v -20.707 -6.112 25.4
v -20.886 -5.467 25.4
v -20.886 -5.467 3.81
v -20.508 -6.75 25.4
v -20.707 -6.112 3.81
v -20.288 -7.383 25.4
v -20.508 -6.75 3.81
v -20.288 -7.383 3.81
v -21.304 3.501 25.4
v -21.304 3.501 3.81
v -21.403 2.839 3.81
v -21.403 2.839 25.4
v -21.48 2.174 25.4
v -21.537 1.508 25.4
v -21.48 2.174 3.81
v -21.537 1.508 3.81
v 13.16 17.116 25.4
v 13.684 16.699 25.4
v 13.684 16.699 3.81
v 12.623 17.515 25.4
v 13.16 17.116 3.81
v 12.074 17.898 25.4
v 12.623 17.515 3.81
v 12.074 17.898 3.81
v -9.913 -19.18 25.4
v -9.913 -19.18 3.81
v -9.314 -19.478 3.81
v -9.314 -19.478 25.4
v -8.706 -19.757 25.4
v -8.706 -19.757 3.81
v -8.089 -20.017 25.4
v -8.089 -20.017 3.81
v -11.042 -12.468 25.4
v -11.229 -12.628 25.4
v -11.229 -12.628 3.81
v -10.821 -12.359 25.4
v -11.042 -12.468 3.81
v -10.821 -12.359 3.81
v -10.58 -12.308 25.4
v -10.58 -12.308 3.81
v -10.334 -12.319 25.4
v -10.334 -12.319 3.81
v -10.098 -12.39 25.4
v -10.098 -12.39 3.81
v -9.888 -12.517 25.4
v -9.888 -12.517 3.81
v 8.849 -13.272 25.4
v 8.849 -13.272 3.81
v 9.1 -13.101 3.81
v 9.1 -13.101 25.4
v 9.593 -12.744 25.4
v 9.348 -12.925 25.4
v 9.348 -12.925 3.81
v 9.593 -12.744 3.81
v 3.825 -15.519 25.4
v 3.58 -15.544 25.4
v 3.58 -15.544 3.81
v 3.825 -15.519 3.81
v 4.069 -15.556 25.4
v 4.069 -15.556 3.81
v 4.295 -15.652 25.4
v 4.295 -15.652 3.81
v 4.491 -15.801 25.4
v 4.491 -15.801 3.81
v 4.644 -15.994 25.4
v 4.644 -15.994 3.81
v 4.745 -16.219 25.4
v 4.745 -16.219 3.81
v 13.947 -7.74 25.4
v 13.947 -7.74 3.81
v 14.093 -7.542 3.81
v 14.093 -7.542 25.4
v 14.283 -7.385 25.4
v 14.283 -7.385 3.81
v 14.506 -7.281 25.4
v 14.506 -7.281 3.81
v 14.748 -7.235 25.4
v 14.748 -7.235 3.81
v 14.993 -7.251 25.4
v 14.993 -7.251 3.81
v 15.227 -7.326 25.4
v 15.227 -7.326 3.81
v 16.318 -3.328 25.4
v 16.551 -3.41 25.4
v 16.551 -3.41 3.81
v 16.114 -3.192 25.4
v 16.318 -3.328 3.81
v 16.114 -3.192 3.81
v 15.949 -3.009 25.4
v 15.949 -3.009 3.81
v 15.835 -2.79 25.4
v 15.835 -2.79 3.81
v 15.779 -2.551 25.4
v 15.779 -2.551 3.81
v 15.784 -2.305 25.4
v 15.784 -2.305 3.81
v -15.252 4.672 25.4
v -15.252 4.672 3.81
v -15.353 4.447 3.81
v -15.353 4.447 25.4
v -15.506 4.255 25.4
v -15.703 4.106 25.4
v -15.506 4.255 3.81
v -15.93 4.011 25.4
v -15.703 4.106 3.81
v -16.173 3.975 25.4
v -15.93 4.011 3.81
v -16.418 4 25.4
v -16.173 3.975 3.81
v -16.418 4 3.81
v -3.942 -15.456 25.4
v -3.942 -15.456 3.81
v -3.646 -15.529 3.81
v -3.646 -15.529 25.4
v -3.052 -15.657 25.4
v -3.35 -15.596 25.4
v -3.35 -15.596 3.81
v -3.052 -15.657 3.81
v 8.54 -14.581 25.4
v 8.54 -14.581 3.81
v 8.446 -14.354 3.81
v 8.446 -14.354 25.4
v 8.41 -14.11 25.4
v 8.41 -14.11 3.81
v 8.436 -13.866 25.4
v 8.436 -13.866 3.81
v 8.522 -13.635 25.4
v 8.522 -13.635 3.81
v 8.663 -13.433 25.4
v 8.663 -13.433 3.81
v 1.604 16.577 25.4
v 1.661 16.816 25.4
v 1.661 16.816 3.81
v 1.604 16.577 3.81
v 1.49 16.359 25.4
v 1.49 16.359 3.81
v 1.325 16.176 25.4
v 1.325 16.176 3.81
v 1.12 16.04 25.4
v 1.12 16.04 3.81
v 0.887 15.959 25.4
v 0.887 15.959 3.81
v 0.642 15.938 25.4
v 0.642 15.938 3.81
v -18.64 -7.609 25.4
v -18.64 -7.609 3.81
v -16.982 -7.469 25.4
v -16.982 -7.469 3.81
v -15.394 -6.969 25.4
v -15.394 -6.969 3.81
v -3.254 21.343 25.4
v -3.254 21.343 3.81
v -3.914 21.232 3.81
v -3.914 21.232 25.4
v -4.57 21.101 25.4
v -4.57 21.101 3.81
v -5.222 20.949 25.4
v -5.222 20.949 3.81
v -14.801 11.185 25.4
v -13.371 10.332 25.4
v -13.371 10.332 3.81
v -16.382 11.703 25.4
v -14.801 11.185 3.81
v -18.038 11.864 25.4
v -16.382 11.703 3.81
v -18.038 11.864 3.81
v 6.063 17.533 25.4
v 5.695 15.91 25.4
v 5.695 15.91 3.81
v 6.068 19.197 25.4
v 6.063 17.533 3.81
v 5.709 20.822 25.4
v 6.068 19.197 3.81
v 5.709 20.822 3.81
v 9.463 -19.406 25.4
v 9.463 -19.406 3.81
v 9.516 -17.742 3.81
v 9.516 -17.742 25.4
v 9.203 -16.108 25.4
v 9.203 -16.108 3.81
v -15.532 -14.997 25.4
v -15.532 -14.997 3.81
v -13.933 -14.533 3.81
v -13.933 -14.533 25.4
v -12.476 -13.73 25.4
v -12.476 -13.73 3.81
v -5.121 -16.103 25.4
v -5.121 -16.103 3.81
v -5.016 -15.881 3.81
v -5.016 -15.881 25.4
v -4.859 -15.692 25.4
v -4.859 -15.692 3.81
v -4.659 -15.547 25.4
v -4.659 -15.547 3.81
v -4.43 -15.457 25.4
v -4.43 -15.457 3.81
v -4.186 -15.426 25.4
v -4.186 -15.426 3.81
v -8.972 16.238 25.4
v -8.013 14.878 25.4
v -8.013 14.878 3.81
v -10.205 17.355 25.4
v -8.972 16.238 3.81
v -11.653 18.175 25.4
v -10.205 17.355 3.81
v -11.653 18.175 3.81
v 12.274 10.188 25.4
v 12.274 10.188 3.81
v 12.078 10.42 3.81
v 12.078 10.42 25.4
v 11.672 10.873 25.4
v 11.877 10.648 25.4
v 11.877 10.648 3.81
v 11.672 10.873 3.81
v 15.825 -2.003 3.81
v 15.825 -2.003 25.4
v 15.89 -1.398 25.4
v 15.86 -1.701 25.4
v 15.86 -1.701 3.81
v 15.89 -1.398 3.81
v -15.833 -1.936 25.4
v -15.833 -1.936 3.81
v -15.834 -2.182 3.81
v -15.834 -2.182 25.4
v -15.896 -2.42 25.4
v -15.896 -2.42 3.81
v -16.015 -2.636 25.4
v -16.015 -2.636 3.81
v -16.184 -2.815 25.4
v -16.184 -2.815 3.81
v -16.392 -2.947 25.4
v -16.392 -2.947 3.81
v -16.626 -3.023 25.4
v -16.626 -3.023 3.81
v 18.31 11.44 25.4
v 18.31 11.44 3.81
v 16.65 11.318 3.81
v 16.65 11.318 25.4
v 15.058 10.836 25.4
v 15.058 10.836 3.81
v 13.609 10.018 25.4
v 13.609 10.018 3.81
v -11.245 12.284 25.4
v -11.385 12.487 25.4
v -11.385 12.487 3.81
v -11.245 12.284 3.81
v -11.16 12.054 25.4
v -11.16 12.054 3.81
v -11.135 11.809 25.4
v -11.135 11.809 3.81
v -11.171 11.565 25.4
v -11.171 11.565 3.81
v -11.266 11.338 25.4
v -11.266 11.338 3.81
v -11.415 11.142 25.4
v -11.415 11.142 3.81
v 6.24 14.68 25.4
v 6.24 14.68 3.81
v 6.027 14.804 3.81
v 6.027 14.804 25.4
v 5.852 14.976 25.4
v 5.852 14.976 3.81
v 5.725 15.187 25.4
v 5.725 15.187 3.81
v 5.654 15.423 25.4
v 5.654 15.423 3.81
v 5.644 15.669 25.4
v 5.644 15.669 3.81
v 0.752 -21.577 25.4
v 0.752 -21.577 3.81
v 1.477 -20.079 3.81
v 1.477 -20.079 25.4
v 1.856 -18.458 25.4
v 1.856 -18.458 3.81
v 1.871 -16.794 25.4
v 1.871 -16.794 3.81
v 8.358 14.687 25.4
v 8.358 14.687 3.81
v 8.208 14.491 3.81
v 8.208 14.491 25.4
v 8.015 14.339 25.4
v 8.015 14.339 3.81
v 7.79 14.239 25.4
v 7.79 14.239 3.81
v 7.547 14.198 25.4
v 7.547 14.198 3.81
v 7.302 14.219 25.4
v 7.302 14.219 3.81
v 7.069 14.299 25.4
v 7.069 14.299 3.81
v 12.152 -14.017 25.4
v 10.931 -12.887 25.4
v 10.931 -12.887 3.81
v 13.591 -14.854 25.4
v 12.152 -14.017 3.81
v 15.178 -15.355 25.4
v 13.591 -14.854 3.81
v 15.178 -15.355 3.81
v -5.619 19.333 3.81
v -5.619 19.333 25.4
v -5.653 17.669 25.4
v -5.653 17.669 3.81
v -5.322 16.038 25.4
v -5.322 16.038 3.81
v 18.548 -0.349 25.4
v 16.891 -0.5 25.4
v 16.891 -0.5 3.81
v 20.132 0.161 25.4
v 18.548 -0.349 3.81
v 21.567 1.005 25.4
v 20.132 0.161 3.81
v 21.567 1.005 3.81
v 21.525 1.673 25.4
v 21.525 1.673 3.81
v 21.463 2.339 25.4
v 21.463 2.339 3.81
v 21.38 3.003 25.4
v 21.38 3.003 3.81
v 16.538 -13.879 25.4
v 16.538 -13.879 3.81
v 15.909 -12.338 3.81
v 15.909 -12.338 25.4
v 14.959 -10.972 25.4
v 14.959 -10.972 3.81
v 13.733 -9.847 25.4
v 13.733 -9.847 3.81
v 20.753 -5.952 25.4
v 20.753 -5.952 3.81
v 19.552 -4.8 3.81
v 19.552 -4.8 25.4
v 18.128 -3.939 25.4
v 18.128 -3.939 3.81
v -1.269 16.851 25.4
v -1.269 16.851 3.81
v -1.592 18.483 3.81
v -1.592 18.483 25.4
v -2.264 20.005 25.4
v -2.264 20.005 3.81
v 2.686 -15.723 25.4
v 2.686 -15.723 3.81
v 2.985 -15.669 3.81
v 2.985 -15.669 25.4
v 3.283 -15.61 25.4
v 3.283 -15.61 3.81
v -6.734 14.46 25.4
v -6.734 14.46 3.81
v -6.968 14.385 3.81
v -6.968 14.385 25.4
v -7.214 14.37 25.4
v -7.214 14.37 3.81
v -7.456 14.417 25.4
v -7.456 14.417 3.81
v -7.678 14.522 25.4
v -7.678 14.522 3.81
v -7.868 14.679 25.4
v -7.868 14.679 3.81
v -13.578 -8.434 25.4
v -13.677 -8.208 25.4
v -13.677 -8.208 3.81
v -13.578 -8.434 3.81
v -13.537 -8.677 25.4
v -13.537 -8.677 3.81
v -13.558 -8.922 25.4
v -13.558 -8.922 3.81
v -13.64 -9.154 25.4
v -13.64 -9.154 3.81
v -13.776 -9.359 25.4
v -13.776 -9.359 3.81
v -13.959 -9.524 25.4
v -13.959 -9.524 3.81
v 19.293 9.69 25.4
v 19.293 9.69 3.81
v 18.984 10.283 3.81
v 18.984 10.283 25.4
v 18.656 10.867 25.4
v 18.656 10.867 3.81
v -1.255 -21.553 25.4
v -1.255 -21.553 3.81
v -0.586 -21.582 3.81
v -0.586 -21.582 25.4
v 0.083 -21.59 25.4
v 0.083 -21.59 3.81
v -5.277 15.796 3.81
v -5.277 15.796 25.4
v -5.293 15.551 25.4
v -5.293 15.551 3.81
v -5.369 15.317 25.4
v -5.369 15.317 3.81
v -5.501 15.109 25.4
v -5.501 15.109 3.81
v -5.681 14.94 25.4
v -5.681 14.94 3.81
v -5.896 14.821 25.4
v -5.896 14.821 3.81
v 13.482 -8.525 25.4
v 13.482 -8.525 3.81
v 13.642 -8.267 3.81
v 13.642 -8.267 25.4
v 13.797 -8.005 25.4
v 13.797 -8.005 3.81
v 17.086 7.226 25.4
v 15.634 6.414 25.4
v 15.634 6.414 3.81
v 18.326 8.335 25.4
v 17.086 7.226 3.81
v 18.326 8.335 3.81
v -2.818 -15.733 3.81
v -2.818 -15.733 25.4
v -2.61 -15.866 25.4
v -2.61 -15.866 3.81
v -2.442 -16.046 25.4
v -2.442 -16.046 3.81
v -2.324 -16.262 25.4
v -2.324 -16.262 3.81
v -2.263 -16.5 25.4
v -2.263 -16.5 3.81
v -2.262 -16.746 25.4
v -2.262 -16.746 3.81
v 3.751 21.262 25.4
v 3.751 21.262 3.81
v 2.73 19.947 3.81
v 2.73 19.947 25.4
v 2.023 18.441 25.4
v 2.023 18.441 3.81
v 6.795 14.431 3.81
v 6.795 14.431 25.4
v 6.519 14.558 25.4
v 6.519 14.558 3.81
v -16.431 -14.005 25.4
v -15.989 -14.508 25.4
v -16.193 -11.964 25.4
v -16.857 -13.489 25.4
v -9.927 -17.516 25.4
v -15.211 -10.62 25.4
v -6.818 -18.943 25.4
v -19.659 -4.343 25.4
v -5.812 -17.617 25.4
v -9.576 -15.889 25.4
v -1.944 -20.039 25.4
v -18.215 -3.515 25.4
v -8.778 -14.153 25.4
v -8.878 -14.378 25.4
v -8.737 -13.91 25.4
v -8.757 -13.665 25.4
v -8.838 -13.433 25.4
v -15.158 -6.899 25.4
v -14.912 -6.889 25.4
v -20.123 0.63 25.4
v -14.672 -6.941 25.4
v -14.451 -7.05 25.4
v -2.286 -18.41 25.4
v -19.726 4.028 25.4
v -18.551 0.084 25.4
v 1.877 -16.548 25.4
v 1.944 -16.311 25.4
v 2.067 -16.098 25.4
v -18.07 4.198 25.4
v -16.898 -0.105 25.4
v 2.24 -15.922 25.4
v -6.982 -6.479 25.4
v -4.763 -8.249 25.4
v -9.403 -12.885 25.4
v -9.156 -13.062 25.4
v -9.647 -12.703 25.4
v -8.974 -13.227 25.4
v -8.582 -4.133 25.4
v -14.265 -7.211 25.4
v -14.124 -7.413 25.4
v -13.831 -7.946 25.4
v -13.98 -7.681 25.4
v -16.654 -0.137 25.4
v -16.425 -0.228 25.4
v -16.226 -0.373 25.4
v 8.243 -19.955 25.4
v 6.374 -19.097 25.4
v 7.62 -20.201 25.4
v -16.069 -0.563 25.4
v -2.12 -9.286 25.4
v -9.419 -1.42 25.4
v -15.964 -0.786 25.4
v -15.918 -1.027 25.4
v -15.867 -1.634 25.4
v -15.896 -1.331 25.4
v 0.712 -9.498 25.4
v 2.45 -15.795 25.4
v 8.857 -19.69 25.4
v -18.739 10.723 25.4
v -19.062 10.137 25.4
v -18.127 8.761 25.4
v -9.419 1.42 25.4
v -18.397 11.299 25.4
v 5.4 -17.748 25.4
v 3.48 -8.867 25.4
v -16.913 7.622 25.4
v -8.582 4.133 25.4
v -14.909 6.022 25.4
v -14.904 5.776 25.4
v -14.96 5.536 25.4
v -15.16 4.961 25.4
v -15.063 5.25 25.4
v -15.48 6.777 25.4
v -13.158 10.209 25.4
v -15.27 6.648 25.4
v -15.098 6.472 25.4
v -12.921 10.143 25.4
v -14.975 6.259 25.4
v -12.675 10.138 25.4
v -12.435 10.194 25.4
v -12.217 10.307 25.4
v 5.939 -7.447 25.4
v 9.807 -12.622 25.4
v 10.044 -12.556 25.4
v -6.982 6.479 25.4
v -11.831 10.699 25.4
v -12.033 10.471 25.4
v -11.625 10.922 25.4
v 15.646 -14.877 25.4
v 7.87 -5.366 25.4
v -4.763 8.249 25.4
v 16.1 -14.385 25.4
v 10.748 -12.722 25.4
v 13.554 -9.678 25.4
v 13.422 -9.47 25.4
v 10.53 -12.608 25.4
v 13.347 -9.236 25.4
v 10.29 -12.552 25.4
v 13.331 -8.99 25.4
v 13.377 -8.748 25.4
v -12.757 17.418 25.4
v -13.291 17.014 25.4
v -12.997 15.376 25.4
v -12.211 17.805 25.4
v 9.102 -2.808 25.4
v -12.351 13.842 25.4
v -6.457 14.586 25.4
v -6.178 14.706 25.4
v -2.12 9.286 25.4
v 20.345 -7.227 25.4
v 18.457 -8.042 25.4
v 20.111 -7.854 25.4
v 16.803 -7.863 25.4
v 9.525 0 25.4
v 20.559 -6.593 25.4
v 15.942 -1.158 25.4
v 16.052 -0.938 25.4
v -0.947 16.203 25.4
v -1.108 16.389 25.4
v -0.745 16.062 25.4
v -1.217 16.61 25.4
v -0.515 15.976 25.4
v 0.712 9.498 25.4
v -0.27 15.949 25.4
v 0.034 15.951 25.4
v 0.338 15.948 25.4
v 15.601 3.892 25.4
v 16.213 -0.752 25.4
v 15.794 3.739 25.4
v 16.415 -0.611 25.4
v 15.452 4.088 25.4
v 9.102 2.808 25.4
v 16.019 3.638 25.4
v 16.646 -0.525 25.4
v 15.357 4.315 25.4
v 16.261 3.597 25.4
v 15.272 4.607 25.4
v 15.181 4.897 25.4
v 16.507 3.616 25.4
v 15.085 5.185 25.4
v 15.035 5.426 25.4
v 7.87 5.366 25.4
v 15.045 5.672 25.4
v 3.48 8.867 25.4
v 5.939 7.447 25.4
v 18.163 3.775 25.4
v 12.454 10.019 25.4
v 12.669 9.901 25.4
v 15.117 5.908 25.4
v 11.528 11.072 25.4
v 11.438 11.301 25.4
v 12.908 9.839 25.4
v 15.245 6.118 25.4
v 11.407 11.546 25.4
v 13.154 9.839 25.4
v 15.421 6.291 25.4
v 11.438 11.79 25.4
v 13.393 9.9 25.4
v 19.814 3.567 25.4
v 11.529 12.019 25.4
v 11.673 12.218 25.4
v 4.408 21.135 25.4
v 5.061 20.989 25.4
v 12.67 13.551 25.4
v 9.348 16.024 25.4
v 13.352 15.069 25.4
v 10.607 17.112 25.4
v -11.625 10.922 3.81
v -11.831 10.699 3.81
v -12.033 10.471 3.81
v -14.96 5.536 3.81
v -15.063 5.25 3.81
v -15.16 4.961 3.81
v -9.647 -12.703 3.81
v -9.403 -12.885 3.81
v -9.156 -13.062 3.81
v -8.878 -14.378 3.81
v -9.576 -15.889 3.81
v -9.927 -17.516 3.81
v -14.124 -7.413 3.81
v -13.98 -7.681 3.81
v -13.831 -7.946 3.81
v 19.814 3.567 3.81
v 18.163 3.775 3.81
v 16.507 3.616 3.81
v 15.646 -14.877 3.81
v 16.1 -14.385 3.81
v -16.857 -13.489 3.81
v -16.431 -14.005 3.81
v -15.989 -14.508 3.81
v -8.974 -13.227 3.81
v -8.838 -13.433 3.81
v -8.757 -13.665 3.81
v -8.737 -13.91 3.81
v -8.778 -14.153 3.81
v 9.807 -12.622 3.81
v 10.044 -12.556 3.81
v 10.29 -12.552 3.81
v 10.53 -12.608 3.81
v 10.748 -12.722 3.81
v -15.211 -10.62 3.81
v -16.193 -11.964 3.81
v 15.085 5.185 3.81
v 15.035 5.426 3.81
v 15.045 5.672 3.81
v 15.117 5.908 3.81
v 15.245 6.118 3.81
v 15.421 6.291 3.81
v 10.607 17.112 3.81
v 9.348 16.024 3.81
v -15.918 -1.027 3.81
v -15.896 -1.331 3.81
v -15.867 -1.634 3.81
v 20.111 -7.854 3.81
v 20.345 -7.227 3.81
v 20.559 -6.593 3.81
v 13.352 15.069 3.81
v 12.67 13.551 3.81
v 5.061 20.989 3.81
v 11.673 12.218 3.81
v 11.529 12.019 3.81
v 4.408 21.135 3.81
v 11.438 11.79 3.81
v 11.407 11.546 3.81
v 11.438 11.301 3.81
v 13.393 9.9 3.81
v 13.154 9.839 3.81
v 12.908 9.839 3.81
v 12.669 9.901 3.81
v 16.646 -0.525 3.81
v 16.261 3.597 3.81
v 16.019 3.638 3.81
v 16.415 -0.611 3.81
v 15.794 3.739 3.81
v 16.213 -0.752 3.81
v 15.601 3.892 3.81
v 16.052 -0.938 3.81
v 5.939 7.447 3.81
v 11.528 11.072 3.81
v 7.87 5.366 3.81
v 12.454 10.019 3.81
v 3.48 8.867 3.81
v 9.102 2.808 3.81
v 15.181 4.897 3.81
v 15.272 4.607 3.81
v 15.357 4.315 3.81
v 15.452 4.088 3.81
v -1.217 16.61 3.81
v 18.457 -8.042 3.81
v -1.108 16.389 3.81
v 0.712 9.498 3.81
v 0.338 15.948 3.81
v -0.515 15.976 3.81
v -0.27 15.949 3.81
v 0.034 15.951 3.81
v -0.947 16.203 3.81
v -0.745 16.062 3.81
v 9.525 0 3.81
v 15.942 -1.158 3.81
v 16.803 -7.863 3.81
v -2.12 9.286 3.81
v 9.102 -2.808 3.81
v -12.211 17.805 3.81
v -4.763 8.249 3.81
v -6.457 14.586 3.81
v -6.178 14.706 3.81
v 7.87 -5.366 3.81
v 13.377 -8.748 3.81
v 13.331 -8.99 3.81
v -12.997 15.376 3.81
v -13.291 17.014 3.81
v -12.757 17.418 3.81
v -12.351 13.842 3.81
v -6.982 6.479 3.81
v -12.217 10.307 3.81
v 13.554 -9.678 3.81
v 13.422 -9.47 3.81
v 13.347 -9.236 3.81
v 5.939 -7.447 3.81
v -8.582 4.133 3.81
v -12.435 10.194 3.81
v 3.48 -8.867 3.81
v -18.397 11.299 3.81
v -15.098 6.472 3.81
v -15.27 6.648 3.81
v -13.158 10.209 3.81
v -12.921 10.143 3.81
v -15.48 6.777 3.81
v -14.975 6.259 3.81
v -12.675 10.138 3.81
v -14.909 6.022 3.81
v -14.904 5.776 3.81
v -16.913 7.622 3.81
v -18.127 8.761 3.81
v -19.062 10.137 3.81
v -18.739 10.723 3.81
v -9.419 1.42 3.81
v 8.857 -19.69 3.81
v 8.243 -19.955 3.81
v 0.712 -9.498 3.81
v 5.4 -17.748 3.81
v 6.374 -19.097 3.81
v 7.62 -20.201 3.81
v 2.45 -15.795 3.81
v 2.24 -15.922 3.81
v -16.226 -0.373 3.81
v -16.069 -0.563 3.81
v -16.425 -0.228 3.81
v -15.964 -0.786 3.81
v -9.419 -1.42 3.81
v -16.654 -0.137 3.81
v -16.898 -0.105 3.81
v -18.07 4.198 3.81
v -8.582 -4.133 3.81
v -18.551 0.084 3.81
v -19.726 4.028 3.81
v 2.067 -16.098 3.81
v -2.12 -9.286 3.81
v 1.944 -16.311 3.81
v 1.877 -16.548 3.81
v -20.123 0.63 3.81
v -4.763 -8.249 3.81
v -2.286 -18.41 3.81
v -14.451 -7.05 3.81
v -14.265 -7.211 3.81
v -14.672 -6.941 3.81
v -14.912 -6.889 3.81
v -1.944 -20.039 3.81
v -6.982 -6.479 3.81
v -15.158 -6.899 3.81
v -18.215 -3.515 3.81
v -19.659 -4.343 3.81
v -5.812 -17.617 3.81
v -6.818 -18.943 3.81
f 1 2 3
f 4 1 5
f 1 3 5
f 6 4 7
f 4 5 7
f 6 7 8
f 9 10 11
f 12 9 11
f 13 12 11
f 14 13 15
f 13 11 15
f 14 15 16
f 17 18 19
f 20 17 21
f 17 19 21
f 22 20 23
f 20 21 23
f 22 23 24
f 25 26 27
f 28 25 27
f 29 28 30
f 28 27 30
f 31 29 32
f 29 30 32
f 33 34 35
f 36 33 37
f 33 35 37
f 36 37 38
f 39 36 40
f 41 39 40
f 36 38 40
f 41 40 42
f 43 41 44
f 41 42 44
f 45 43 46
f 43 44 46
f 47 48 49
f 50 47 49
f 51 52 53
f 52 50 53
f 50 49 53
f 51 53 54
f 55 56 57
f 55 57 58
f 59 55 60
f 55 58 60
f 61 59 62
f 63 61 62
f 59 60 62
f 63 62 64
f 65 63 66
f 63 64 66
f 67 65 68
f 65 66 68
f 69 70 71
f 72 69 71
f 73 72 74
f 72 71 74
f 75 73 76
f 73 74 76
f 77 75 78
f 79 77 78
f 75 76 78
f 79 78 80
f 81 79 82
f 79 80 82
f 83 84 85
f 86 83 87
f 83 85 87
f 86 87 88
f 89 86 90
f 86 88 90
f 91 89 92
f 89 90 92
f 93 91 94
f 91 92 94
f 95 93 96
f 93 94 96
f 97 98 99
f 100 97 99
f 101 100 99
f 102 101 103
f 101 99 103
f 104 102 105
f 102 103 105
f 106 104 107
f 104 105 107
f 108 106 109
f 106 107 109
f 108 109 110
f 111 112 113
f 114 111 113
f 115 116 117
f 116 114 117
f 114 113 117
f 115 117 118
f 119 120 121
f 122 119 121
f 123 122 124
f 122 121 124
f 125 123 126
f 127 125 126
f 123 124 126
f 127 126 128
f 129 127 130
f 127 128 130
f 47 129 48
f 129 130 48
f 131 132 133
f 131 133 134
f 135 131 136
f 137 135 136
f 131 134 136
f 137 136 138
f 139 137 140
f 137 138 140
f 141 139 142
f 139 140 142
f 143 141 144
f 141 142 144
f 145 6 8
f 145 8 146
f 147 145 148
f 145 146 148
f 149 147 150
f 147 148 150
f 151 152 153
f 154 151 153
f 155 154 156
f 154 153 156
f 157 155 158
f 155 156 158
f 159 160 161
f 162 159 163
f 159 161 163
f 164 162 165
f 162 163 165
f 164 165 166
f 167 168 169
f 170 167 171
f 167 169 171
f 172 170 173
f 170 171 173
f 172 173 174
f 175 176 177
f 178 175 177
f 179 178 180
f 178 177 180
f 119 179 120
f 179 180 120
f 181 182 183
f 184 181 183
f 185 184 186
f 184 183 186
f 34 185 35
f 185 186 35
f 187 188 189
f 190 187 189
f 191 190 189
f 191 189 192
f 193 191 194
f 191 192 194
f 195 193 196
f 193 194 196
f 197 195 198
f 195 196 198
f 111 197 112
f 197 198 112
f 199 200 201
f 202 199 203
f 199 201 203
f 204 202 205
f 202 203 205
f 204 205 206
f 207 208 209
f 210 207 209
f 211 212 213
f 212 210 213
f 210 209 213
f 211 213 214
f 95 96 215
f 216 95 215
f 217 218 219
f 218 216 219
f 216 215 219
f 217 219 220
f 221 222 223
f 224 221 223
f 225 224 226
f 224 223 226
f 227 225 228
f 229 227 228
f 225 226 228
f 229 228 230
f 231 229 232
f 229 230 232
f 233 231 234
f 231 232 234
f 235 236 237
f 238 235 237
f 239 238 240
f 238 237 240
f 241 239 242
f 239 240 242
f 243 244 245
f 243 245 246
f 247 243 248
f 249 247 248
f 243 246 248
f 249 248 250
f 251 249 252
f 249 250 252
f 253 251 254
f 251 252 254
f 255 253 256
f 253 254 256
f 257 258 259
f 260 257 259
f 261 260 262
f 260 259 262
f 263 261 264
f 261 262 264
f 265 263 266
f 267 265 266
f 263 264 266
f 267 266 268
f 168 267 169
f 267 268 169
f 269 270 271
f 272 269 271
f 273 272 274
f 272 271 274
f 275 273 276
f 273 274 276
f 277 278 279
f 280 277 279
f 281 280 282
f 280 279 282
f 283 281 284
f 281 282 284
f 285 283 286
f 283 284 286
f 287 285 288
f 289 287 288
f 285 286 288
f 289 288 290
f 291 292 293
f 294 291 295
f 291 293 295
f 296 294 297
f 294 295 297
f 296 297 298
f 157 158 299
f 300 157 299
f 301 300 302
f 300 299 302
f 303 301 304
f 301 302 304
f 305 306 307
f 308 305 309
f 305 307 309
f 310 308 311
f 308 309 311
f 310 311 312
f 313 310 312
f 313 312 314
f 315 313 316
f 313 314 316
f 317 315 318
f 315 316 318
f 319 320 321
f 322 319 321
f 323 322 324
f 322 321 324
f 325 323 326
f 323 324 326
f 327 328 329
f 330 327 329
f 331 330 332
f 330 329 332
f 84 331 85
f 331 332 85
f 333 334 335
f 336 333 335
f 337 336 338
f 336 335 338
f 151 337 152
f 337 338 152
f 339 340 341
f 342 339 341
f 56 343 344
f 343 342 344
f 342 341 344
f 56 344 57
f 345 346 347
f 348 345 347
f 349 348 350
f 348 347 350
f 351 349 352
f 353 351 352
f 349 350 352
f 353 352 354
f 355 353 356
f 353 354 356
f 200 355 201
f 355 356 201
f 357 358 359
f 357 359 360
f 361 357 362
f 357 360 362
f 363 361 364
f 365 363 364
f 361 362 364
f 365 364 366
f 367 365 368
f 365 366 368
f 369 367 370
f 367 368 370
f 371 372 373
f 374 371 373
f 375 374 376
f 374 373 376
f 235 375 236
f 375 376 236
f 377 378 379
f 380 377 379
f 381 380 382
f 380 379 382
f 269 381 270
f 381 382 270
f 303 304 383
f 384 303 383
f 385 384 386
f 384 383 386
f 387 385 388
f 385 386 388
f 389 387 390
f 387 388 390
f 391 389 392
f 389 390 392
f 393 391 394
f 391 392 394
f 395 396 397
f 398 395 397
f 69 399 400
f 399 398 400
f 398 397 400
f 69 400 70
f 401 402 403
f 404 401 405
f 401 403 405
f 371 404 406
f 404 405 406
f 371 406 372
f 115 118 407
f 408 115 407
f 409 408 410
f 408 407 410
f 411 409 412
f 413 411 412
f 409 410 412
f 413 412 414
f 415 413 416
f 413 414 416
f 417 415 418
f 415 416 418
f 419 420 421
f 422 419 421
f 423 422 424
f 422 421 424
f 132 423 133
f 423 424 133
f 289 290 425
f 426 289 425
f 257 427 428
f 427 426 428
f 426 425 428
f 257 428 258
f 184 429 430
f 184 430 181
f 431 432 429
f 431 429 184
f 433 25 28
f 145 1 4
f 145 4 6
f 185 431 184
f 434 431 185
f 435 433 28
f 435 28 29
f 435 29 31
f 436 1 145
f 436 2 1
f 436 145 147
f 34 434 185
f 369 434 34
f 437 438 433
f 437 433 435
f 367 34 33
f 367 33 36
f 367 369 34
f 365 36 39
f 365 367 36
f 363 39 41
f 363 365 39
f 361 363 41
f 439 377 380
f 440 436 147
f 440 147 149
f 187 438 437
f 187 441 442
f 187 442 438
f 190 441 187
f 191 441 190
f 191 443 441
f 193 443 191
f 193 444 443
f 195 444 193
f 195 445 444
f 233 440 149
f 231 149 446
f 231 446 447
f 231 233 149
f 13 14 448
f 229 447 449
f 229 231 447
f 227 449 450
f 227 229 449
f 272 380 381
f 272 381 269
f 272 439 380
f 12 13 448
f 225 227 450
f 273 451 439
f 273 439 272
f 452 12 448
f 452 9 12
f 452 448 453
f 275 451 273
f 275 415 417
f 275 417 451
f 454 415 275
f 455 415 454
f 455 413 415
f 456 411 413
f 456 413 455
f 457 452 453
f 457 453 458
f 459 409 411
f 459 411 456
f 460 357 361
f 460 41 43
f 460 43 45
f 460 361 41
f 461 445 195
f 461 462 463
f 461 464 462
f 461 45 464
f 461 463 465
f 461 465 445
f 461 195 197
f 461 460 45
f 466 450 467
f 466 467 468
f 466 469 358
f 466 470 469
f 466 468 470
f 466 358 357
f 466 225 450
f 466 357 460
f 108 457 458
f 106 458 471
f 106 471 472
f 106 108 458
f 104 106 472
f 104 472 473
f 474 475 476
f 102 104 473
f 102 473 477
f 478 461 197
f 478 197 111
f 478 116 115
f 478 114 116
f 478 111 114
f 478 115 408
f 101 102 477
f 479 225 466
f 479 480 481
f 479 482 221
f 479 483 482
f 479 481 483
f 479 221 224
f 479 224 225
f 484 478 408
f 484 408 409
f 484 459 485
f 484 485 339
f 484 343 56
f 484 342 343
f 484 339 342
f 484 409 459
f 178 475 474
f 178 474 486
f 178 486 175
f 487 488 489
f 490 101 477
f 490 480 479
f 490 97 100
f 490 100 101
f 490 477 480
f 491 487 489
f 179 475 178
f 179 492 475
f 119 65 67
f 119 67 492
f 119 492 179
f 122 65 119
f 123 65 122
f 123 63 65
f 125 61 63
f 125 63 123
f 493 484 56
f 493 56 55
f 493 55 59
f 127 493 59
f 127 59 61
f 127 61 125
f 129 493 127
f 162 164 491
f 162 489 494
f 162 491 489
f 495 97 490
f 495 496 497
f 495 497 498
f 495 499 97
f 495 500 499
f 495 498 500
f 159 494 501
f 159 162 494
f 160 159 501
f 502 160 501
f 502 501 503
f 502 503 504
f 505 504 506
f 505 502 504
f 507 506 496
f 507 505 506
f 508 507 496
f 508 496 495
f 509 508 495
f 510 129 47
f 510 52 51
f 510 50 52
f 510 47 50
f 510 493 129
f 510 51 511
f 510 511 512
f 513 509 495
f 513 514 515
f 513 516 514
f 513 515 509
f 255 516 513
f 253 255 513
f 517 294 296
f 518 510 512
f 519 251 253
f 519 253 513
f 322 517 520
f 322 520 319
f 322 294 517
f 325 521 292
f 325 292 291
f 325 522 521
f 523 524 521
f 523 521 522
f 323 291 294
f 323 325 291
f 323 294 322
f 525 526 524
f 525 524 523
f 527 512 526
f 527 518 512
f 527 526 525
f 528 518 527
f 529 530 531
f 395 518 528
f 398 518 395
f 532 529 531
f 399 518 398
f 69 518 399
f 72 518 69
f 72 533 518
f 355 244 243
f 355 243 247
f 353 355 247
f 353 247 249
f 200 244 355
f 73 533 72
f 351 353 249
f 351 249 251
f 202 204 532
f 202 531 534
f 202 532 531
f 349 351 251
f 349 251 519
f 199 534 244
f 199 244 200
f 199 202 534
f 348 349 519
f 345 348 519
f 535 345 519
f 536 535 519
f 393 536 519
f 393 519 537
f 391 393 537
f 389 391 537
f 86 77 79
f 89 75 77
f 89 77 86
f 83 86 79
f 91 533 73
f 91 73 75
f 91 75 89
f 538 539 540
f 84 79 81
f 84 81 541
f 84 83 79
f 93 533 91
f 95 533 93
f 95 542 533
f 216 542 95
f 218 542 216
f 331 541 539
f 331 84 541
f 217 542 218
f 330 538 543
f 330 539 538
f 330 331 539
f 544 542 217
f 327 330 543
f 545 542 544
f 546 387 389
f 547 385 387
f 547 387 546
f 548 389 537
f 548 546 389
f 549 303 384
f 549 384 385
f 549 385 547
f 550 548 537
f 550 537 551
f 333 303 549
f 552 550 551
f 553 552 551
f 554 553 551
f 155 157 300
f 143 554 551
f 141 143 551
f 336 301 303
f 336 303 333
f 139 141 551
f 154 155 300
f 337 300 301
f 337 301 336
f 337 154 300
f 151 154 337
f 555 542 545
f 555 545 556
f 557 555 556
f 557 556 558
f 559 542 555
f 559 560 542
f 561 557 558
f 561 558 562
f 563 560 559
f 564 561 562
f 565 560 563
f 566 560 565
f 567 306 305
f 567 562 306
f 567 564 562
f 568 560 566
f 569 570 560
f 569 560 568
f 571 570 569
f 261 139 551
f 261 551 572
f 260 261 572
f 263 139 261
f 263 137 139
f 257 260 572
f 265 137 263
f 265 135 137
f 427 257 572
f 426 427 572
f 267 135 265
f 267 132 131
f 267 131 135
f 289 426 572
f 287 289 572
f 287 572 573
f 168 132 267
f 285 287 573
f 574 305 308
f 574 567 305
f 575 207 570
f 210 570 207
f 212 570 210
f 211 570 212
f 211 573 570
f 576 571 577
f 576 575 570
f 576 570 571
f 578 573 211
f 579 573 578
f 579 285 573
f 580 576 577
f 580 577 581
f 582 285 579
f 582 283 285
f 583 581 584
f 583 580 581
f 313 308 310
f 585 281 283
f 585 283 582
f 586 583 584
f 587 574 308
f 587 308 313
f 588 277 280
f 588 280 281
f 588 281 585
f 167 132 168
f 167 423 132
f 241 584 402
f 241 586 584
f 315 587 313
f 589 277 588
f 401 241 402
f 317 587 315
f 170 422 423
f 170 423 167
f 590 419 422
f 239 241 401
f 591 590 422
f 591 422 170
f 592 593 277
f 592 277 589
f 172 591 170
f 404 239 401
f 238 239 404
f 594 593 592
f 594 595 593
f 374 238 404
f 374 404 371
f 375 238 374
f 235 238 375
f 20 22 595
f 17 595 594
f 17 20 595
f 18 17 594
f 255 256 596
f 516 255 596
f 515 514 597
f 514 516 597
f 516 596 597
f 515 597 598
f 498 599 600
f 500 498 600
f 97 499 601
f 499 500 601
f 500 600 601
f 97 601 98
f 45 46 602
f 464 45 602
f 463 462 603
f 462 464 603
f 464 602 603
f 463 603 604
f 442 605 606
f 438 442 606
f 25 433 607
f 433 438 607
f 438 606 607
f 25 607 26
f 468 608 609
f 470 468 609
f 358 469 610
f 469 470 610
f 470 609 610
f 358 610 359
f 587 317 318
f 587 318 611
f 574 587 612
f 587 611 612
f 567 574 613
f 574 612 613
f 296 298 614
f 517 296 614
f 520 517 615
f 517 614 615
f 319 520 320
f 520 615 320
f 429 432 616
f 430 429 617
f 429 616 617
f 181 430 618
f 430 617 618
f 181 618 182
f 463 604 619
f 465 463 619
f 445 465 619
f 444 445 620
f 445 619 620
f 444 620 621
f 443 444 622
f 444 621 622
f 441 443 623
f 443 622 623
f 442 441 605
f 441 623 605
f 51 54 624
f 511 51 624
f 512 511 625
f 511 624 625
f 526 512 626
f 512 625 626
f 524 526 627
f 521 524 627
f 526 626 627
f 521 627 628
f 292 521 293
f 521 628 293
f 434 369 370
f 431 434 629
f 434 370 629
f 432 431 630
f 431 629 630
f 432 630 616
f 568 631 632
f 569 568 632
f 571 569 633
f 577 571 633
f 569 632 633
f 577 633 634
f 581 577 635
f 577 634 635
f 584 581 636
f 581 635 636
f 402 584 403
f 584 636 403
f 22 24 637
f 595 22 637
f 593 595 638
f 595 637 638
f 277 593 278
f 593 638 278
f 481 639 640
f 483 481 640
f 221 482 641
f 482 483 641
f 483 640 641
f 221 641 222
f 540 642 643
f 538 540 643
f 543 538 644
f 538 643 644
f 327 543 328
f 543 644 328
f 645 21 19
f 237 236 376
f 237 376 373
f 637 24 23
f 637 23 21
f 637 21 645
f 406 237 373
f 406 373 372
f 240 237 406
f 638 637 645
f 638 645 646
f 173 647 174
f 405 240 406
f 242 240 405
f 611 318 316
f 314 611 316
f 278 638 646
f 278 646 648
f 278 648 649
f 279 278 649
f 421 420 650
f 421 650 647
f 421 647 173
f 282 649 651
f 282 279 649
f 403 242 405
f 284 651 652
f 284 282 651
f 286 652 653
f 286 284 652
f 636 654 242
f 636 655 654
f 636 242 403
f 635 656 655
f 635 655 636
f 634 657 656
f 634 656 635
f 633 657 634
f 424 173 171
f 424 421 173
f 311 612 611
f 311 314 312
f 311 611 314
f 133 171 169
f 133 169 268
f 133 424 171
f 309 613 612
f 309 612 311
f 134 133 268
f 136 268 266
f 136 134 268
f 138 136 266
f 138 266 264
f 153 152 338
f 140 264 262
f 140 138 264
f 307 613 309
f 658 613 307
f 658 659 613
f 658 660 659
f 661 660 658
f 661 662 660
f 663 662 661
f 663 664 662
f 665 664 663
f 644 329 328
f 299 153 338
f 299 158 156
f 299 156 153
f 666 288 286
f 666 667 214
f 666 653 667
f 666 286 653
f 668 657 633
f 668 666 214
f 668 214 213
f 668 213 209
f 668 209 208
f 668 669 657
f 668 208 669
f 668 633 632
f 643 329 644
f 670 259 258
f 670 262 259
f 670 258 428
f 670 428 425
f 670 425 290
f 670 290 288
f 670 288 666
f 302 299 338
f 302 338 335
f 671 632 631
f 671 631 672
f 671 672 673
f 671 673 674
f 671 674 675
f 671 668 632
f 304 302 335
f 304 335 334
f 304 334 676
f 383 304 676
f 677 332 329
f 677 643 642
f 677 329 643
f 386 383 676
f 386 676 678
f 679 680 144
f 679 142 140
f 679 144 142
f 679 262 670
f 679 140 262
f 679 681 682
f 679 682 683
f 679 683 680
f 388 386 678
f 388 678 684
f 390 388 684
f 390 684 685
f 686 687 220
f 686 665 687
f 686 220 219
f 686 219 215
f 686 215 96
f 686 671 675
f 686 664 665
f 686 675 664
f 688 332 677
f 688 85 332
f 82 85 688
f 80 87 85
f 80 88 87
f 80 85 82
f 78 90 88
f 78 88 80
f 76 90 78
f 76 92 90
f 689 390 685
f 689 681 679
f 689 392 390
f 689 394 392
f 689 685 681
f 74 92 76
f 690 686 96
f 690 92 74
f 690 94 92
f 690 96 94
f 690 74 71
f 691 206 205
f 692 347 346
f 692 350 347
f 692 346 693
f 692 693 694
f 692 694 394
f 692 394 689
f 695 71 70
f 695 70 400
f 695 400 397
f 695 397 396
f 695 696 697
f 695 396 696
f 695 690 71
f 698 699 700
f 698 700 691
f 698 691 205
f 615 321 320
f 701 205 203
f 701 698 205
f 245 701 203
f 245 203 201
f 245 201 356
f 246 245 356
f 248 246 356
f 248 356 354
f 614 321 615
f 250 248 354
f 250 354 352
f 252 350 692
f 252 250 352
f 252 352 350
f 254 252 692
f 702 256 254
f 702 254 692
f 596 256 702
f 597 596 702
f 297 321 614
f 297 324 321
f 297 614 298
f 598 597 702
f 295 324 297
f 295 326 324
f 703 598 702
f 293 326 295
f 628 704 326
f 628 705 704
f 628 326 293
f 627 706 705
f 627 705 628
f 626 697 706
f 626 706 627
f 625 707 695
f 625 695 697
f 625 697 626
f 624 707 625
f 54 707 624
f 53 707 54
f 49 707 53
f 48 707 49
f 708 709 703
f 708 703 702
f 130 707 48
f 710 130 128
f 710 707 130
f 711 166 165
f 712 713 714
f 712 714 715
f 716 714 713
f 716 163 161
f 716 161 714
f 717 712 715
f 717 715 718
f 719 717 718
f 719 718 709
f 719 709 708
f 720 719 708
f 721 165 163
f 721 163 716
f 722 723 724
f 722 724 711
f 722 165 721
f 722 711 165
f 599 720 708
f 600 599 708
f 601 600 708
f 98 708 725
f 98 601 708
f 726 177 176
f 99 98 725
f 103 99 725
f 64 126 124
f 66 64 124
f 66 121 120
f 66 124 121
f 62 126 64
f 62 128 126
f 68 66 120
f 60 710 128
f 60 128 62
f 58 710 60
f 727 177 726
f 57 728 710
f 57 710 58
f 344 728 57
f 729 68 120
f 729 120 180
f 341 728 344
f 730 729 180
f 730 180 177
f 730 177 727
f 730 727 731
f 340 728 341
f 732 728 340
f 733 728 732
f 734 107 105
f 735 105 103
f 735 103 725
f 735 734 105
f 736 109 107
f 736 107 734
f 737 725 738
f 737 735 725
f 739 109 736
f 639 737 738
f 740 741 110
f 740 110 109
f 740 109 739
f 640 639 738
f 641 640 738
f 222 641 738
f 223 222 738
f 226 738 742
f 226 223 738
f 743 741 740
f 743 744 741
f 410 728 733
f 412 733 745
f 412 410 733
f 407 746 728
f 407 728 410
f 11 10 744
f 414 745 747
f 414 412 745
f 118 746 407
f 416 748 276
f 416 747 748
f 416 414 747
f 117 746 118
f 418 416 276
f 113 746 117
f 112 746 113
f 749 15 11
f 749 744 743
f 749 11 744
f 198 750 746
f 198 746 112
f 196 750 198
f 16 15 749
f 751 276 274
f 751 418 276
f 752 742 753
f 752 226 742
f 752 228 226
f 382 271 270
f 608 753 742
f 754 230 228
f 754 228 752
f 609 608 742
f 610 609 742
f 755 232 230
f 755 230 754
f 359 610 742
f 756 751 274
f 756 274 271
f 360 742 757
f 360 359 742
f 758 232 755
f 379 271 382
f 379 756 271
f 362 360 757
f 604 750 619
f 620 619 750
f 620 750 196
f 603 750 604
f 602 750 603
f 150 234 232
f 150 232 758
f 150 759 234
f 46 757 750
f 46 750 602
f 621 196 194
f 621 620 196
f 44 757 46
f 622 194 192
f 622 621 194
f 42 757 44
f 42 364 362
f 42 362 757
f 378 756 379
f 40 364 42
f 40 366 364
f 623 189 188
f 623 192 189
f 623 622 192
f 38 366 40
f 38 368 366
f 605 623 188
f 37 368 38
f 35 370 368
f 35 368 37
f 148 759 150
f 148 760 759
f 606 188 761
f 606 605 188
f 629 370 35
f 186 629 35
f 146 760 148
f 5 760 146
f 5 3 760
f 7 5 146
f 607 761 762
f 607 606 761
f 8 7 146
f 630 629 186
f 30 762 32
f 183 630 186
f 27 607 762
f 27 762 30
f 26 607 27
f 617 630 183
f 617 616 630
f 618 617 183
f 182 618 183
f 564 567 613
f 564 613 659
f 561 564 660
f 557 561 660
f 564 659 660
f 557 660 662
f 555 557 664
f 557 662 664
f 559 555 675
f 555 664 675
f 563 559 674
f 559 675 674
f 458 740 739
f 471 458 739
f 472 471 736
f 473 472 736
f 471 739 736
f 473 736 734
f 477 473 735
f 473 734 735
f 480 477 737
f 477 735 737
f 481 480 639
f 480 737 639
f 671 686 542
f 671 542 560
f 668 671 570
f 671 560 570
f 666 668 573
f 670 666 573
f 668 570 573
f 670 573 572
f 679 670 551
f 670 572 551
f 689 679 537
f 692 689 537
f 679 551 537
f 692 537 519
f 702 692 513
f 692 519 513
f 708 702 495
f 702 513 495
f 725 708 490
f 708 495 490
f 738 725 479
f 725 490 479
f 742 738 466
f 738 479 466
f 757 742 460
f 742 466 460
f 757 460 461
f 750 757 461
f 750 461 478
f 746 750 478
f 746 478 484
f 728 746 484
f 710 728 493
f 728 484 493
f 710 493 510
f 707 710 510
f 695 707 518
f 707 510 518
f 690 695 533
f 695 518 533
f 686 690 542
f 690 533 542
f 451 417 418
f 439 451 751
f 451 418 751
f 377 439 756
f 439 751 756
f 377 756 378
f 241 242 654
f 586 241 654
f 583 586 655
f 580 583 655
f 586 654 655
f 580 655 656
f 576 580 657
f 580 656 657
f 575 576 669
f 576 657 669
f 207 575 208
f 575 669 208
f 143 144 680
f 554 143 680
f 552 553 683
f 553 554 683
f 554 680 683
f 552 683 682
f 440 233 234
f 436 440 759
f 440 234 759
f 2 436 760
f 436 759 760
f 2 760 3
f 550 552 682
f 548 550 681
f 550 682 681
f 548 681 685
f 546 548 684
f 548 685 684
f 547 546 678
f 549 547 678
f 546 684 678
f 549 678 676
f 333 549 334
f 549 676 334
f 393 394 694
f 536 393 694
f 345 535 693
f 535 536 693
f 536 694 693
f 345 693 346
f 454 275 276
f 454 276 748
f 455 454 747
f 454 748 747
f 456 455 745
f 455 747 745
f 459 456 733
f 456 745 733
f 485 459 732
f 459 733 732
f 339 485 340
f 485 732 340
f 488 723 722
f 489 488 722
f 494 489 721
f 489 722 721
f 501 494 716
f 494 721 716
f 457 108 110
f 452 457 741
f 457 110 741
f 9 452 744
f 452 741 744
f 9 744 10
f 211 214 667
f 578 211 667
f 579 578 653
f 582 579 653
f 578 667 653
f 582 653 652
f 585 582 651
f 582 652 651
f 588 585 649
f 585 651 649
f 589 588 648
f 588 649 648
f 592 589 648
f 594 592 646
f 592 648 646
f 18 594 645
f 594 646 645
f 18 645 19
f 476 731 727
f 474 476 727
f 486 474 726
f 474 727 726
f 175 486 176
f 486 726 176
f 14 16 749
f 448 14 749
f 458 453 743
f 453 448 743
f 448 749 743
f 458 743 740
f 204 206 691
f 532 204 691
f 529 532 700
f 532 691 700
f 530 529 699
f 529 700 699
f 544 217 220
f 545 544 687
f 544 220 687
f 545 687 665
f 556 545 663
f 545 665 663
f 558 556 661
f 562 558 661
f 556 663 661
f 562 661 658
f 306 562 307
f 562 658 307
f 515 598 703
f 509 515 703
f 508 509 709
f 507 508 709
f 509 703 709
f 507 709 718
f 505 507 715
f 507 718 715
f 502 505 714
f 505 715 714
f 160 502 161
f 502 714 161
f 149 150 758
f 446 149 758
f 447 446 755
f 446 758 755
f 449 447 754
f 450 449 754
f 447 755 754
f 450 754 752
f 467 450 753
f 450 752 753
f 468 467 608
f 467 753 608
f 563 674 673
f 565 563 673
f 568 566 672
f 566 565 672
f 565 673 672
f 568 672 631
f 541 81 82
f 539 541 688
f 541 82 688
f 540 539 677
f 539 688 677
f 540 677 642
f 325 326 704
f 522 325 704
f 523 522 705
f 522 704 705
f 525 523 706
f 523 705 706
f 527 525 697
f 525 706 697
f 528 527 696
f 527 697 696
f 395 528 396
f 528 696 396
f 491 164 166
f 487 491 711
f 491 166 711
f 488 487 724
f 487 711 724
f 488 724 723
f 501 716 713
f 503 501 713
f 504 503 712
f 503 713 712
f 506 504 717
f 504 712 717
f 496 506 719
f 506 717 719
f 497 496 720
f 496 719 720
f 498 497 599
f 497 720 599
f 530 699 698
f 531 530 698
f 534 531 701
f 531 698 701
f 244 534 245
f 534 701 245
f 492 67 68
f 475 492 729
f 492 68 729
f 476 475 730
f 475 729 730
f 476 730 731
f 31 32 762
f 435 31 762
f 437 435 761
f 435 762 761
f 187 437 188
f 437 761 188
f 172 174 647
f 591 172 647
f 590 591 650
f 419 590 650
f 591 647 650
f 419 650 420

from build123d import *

# Parameters (mm, degrees)
SKETCH3_R               = 21.59
GEARBODY_DEPTH          = 25.4
TOOTHCUT_DEPTH          = 40.716699259
CIRPATTERN1_COUNT       = 15
BOREDIA_R               = 9.525
BORE_DEPTH              = 12700
CUT_EXTRUDE1_DEPTH      = 40.703986775
CUT_EXTRUDE1_DEPTH_BACK = 40.703986775


with BuildPart() as part:
    # Sketch3 → gearBody (new body)
    with BuildSketch(Plane.XY):
        Circle(SKETCH3_R)
    extrude(amount=GEARBODY_DEPTH)

    # Sketch2 → toothCut (cut, through all)
    with BuildSketch(Plane.XY):
        with BuildLine():
            ThreePointArc((15.783846764, -2.304552616), (15.843293638, -1.852249483), (15.889781974, -1.39843136))
            ThreePointArc((15.889781974, -1.39843136), (16.213055843, -0.751556907), (16.890861518, -0.499501321))
            ThreePointArc((16.890861518, -0.499501321), (20.504912911, 0.340315353), (23.283949955, 2.798691365))
            ThreePointArc((23.283949955, 2.798691365), (23.292901215, -2.723187818), (22.010467945, -8.09409042))
            ThreePointArc((22.010467945, -8.09409042), (19.873444675, -5.060974685), (16.550574786, -3.410158156))
            ThreePointArc((16.550574786, -3.410158156), (15.949189176, -3.008551507), (15.783846764, -2.304552616))
        make_face()
    toothcut = extrude(amount=TOOTHCUT_DEPTH, mode=Mode.SUBTRACT)

    # CirPattern1: toothCut ×15 about axis
    cirpattern1_axis = Axis((0, 0, 0), (0, 0, 1))
    for i in range(1, CIRPATTERN1_COUNT):
        add(toothcut.rotate(cirpattern1_axis, i * 360 / CIRPATTERN1_COUNT), mode=Mode.SUBTRACT)

    # boreDia → bore (cut, symmetric)
    with BuildSketch(Plane.XY):
        Circle(BOREDIA_R)
    extrude(amount=BORE_DEPTH, both=True, mode=Mode.SUBTRACT)

    # Sketch4 → Cut-Extrude1 (cut, two sides: drawn at the far end of the back side and taken through both)
    with BuildSketch(Plane(origin=(0, 0, 0), x_dir=(0, 0, -1), z_dir=(1, 0, 0)).offset(-CUT_EXTRUDE1_DEPTH_BACK)):
        Polygon((-3.81, 26.191979423), (-3.81, -31.870423863), (6.096210589, -32.468383172), (8.920928288, 23.481458771), align=None)
    extrude(amount=CUT_EXTRUDE1_DEPTH + CUT_EXTRUDE1_DEPTH_BACK, mode=Mode.SUBTRACT)


solid = part.part
